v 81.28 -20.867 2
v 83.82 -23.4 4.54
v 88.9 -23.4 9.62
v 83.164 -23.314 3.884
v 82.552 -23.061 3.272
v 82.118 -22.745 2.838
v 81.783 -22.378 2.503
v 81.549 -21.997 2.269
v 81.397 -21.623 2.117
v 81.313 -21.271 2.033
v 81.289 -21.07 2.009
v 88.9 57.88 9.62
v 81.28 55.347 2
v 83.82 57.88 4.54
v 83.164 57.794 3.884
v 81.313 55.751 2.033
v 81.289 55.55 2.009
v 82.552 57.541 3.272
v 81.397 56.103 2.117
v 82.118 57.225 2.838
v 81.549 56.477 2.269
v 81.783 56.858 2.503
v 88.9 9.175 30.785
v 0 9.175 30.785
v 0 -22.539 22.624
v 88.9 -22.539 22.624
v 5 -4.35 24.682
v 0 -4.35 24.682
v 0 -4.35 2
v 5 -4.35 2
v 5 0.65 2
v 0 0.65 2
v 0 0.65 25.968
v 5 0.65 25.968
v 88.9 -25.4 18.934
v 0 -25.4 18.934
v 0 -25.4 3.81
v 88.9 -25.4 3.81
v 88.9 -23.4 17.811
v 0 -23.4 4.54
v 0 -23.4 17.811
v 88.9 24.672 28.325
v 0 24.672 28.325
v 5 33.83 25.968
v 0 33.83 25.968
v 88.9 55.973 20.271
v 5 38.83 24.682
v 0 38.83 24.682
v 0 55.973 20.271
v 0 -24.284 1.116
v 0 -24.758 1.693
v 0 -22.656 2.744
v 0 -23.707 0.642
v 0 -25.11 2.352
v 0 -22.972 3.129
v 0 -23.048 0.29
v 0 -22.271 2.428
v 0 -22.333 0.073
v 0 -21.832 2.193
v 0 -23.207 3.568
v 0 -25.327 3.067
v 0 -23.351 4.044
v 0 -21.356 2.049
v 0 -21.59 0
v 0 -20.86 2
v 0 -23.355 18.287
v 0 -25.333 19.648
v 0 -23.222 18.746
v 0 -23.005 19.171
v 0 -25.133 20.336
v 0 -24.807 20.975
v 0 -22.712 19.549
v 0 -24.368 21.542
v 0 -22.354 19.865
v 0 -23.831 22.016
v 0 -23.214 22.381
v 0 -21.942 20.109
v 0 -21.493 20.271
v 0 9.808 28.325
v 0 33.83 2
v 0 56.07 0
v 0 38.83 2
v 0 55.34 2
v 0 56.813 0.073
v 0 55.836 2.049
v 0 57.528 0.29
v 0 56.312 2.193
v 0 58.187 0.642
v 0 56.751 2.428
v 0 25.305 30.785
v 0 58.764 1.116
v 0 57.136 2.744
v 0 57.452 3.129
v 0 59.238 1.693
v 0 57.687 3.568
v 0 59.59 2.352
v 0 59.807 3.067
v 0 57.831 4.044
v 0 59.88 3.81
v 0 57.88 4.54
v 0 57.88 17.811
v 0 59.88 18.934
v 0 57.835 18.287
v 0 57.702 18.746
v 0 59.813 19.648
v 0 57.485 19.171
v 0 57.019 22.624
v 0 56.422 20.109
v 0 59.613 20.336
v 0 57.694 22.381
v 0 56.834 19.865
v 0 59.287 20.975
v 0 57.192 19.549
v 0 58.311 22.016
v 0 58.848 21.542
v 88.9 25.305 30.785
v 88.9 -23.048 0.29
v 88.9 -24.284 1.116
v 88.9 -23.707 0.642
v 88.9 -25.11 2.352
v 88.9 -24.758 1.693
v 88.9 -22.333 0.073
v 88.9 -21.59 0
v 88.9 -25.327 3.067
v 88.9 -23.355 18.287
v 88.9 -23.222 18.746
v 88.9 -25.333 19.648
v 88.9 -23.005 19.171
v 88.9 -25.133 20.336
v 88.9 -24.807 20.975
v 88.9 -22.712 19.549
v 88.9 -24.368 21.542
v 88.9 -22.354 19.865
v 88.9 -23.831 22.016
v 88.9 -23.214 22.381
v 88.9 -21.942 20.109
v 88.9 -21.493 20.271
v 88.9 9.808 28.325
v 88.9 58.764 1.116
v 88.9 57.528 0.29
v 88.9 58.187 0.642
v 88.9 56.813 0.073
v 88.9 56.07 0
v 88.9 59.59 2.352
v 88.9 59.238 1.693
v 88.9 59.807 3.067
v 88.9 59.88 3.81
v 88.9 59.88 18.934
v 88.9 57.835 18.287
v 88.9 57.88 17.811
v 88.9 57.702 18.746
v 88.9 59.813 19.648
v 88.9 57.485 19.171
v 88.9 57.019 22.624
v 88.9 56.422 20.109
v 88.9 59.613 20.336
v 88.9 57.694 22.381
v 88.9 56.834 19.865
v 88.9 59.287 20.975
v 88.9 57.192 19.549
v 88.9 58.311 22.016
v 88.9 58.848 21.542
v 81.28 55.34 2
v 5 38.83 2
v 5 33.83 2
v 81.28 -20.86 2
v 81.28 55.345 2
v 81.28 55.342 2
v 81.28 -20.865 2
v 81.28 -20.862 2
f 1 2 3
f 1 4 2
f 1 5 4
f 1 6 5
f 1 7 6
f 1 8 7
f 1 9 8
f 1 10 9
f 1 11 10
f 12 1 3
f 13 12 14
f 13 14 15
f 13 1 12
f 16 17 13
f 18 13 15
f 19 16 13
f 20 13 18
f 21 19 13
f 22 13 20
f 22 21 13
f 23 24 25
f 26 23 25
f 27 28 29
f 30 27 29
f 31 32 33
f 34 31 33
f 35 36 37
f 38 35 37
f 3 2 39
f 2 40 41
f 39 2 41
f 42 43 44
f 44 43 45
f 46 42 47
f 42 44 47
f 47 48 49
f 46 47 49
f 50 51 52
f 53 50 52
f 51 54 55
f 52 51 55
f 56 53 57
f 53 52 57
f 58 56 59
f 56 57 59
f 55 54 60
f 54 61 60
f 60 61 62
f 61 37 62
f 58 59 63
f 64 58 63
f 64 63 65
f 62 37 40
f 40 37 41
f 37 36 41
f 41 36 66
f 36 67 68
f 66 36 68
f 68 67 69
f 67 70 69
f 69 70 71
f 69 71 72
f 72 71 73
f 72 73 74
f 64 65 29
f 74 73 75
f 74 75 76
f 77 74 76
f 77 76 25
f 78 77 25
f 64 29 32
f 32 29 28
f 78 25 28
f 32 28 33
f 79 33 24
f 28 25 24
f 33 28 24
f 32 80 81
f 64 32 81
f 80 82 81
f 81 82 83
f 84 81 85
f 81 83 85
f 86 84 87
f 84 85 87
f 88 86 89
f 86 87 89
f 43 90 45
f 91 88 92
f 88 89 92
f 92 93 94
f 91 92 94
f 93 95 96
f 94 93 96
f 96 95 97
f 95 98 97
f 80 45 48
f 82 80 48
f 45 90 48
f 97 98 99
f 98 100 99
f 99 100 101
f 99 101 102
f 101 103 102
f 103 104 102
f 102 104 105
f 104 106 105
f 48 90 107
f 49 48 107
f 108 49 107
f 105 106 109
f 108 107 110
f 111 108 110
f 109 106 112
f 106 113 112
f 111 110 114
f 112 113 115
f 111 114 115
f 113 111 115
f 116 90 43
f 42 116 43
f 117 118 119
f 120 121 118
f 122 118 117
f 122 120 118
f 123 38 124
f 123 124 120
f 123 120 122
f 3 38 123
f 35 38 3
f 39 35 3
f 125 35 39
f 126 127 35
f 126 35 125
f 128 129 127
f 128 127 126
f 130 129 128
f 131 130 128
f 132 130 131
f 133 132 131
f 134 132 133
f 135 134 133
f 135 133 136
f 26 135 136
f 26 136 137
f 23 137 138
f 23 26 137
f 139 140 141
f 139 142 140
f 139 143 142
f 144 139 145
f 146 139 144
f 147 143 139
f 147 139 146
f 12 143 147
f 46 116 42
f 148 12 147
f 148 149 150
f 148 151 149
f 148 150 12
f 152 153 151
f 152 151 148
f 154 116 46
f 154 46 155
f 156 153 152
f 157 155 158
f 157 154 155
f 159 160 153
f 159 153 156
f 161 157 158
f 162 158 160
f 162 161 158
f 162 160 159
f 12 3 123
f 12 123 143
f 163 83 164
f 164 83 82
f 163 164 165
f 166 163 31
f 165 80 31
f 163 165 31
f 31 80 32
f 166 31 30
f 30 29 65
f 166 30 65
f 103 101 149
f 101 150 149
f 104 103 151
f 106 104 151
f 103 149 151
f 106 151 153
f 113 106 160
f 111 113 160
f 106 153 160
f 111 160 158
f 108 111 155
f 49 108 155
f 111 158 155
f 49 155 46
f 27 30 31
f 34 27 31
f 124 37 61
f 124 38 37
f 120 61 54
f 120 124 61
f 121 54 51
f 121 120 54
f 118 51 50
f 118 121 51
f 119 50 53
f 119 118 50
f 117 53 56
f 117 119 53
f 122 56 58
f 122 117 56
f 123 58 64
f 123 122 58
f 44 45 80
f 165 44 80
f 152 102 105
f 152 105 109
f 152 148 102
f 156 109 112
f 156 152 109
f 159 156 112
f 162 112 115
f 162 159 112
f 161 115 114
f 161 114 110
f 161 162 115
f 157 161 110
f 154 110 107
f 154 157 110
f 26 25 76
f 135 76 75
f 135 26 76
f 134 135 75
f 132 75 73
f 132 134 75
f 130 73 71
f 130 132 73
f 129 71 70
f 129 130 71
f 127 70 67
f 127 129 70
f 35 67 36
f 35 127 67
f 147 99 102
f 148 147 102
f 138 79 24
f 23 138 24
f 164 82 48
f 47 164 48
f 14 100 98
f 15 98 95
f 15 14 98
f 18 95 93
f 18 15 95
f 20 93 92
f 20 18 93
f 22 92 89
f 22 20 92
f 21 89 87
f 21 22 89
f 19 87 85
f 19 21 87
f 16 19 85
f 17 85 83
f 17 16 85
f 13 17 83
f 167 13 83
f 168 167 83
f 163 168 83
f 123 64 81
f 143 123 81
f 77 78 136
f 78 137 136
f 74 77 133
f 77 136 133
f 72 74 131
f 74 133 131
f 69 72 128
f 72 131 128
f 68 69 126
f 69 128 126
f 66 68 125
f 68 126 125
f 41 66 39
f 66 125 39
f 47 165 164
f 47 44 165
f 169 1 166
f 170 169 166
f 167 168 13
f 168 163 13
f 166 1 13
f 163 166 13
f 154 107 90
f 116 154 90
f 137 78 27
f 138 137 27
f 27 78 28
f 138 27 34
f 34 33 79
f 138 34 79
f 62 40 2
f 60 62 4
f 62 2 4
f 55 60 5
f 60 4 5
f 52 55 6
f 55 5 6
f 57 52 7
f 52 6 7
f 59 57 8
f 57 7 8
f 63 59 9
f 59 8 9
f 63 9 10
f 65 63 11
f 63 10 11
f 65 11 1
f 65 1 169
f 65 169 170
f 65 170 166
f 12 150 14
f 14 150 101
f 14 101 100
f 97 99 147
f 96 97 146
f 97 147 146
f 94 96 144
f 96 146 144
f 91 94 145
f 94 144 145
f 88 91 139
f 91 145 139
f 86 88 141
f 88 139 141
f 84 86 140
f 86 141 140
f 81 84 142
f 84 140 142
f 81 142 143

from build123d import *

# Parameters (mm, degrees)
F1_DEPTH = 88.9
F3_DEPTH = 5
F4_W     = 81.28
F4_H     = 7.62
F5_DEPTH = 7.62
F6_R     = 3.81
F7_R     = 2.54
F8_SIZE  = 7.61999


# Not quite as in the source:
# - a fillet or chamfer is up to 0.001 mm smaller than in the source, because OpenCascade refuses the exact size


with BuildPart() as f1:
    # F0 (on Right) → F1 (new body)
    with BuildSketch(Plane.YZ):
        Polygon((17.24, 2), (17.24, 0), (59.88, 0), (59.88, 21.8881247946), (25.3046089437, 30.7845262293), (24.6716719012, 28.3246500739), (57.88, 19.78), (57.88, 2), align=None)
        Polygon((-25.4, 21.8881247946), (-25.4, 0), (17.24, 0), (17.24, 2), (-23.4, 2), (-23.4, 19.78), (9.8083280988, 28.3246500739), (9.1753910563, 30.7845262293), align=None)
    extrude(amount=F1_DEPTH)

    # F2 (on Right) → F3 (join)
    with BuildSketch(Plane.YZ):
        Polygon((33.83, 2), (38.83, 2), (38.83, 17.7), (38.83, 24.6816494725), (33.83, 25.9681716437), (33.83, 17.7), align=None)
        Polygon((-4.35, 17.7), (-4.35, 2), (0.65, 2), (0.65, 17.7), (0.65, 25.9681716437), (-4.35, 24.6816494725), align=None)
    extrude(amount=F3_DEPTH)

    # F4 (on face) → F5 (join)
    with BuildSketch(Plane.YZ.offset(88.9)):
        with Locations((17.24, 5.81)):
            Rectangle(F4_W, F4_H)
    extrude(amount=-F5_DEPTH)

    # F6
    f6_edges = [f1.edges().sort_by_distance(p)[0] for p in [
        (44.45, -25.4, 0),
        (44.45, 59.88, 0),
        (44.45, -25.4, 21.888125),
        (44.45, 59.88, 21.888125),
    ]]
    fillet(f6_edges, radius=F6_R)

    # F7
    f7_edges = [f1.edges().sort_by_distance(p)[0] for p in [
        (40.64, 57.88, 2),
        (40.64, -23.4, 2),
        (44.45, -23.4, 19.78),
        (44.45, 57.88, 19.78),
    ]]
    fillet(f7_edges, radius=F7_R)

    # F8 (size 7.62 in the source; OpenCascade refuses exactly that, so slightly less here)
    f8_edges = [f1.edges().sort_by_distance(p)[0] for p in [
        (81.28, 17.24, 9.62),
    ]]
    chamfer(f8_edges, length=F8_SIZE)


solid = f1.part
